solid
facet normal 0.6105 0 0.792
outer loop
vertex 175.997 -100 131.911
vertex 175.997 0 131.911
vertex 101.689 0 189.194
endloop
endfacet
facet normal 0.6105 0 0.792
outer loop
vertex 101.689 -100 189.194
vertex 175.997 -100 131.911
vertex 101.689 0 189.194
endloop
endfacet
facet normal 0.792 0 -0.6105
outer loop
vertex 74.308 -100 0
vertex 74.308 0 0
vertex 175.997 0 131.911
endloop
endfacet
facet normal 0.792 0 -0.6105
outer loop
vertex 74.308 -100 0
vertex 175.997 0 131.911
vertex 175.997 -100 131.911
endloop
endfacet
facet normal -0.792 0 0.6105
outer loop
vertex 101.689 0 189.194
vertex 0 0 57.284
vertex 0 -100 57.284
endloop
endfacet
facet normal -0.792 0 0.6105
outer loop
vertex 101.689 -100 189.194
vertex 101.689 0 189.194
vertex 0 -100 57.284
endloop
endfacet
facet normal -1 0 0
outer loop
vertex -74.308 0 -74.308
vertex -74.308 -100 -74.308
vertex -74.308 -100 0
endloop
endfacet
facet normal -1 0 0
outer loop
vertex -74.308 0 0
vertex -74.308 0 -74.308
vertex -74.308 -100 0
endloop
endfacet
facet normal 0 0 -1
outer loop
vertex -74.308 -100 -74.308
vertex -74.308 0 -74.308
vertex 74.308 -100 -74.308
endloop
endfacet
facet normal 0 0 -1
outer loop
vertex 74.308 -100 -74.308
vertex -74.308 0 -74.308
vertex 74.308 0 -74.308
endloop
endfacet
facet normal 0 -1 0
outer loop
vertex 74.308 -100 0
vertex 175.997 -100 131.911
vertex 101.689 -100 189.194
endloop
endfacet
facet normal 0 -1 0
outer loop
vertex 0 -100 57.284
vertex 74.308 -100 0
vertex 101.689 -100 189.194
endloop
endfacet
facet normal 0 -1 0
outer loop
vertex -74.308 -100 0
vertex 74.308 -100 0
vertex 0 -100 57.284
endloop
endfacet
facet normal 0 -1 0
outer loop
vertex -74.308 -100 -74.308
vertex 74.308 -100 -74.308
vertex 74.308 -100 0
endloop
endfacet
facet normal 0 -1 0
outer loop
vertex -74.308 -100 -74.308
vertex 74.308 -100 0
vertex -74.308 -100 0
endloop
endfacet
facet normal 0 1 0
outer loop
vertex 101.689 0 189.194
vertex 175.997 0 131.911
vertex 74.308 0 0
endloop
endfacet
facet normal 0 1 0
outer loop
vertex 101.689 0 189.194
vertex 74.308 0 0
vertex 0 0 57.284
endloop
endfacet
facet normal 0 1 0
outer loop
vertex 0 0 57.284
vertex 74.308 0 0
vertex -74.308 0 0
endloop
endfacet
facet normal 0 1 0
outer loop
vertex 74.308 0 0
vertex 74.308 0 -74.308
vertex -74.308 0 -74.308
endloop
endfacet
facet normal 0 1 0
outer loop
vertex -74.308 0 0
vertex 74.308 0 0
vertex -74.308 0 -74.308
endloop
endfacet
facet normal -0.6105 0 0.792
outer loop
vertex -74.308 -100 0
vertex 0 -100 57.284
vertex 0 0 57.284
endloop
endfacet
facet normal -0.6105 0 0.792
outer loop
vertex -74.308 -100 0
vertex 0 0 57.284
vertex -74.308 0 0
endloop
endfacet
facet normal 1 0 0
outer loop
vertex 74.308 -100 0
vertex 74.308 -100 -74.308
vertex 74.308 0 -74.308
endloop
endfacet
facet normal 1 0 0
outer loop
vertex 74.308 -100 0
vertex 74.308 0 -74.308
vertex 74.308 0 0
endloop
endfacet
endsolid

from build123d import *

# Parameters (mm, degrees)
F0_W     = 148.616835475
F0_H     = 74.3084251881
F1_DEPTH = 100
F2_DEPTH = 166.5562391281


with BuildPart() as f1:
    # F0 (on Front) → F1 (new body)
    with BuildSketch(Plane.XZ):
        Polygon((0, 57.283565402), (-74.3084102869, 0), (74.3084251881, 0), align=None)
        with Locations((7.4506e-06, -37.154212594)):
            Rectangle(F0_W, F0_H)
    extrude(amount=F1_DEPTH)

    # F2 (add): a face of the model
    f2_faces = [f1.faces().sort_by_distance(p)[0] for p in [
        (37.154212594, -50, 28.641782701),
    ]]
    extrude(f2_faces, amount=F2_DEPTH)


solid = f1.part
